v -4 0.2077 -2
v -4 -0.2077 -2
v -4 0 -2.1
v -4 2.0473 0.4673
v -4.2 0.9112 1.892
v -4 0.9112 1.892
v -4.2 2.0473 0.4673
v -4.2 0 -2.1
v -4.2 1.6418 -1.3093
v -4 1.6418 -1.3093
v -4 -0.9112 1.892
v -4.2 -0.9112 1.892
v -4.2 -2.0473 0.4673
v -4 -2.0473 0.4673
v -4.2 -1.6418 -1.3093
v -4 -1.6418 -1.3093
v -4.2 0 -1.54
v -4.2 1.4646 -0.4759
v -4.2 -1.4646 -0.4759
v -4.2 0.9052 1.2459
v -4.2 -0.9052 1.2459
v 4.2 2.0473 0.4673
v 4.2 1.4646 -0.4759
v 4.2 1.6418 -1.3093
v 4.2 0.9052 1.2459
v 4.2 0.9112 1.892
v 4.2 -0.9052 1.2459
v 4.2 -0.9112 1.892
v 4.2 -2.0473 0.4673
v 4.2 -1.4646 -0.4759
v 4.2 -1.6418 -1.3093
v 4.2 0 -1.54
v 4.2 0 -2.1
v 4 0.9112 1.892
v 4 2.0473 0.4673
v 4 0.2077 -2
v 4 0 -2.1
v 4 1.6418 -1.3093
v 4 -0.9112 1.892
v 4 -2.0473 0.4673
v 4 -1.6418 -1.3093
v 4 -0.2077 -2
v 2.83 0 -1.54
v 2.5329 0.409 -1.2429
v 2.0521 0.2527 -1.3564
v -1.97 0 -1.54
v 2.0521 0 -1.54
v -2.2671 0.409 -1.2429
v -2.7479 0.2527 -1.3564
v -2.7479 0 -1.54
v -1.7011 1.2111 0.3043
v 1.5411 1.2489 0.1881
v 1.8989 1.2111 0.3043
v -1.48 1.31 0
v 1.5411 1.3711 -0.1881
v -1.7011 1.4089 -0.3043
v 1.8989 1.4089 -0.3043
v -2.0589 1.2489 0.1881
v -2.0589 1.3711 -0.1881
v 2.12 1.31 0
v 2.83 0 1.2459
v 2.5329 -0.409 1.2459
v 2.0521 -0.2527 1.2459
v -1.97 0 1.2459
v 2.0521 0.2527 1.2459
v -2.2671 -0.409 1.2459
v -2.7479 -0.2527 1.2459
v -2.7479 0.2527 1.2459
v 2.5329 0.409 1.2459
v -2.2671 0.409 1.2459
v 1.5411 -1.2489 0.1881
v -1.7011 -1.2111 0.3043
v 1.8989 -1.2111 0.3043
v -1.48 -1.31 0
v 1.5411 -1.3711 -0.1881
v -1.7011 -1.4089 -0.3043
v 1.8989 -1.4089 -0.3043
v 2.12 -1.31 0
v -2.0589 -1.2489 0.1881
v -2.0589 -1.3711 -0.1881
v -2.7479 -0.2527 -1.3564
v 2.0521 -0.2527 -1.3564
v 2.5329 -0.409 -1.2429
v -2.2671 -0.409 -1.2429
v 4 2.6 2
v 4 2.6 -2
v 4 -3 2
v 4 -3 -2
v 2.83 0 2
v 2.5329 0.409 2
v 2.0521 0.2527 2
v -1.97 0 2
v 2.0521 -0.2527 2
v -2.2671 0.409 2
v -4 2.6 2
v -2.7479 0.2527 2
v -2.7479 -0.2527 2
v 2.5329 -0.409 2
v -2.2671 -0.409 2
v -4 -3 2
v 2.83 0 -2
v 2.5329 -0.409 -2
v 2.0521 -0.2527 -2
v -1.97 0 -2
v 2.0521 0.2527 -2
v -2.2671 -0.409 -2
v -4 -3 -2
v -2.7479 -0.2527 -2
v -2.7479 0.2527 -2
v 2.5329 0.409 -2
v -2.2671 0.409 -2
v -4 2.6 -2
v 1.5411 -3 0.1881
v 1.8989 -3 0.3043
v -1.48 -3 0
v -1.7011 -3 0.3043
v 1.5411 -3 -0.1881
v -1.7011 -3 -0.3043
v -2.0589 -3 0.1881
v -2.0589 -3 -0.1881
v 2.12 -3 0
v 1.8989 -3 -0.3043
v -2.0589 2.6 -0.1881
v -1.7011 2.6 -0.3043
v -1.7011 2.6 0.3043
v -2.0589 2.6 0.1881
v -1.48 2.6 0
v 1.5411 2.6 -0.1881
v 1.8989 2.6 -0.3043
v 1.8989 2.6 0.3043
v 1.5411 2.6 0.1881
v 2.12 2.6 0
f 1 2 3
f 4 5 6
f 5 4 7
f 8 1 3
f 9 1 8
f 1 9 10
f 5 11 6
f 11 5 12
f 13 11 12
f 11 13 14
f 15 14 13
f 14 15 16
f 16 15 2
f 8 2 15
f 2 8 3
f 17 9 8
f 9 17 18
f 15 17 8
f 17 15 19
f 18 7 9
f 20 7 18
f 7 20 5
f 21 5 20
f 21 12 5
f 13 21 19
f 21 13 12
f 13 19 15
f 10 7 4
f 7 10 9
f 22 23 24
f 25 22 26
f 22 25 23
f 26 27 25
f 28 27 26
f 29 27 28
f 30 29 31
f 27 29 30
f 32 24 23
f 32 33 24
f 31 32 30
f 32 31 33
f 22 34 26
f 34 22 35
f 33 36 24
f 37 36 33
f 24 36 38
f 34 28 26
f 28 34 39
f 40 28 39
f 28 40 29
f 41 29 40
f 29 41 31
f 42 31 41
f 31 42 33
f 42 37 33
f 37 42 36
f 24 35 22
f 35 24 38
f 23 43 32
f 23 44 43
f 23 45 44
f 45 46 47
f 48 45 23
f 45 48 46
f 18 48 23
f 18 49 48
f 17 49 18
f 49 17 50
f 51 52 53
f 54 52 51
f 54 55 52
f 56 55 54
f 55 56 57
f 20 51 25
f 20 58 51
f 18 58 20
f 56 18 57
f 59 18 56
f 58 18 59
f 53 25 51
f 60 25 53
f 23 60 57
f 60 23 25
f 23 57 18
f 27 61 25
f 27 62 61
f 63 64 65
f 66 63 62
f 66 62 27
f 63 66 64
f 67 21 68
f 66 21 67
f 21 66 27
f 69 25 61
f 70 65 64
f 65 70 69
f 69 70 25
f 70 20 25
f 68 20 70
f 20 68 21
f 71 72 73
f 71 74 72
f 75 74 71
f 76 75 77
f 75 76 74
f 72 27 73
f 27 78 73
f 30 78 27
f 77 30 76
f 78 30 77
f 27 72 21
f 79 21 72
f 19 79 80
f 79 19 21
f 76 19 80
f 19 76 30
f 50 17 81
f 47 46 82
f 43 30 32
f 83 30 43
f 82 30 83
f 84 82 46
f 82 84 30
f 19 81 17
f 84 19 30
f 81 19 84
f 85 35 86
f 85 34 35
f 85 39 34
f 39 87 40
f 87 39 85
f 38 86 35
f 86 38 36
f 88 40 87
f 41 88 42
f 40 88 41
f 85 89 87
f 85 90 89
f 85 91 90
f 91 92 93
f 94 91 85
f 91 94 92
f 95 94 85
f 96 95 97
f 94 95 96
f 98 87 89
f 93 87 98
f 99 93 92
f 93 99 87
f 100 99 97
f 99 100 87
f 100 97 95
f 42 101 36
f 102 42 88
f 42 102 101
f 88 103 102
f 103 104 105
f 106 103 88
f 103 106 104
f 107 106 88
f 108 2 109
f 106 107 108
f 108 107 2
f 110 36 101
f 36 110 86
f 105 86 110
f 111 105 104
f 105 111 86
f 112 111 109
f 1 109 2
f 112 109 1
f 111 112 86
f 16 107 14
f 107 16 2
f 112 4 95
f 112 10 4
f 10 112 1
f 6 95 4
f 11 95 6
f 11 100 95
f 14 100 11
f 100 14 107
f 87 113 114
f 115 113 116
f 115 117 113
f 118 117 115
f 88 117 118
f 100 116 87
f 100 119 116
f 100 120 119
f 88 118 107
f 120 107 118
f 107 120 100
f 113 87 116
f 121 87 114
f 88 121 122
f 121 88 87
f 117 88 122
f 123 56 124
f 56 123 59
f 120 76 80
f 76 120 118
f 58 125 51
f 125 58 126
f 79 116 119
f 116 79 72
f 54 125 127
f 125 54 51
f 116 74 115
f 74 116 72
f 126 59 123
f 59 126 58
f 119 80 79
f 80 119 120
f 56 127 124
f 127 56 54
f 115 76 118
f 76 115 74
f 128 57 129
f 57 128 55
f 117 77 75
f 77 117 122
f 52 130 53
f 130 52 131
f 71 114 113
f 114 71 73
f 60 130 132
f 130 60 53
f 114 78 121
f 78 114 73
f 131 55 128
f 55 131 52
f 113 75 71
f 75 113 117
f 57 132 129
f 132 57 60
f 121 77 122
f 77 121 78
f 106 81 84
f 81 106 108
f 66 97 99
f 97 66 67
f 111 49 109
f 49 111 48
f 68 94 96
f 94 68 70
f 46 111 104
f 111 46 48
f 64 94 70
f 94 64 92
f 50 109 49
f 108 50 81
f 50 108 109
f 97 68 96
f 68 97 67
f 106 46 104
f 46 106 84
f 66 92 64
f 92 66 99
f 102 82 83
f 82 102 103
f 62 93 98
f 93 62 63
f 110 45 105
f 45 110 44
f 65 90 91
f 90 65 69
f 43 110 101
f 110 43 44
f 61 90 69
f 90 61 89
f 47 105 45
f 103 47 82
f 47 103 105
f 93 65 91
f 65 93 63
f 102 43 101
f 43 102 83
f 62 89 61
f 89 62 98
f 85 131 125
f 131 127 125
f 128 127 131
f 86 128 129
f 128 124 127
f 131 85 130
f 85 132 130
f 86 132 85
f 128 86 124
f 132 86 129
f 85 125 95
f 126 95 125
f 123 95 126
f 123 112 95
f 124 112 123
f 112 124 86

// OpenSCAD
// Parameters
total_length = 8.0; //[4.0:16.0:0.1]
scale = 0.2; //[0.1:0.4:0.01]
bearing_od_mm = 3.0; //[1.5:6.0:0.05]
bearing_length_mm = 4.8; //[2.4:9.6:0.05]
rod_diameter_mm = 1.6; //[0.8:3.2:0.05]
print_clearance_mm = 0.04; //[0.0:0.2:0.01]
bore_diameter_mm = 3.08; //[2.8:3.4:0.01]
block_length_mm = 8.0; //[4.0:16.0:0.1]
block_width_mm = 6.0; //[3.0:12.0:0.1]
block_height_mm = 4.0; //[2.0:8.0:0.1]
wall_thickness_mm = 0.6; //[0.3:1.2:0.05]
end_stop_lip_mm = 0.2; //[0.1:0.6:0.05]
use_split_clamp = 1; //[0:1:1]
clamp_slot_width_mm = 0.4; //[0.1:1.0:0.05]
clamp_bolt_hole_diameter_mm = 0.64; //[0.4:1.2:0.02]
clamp_bolt_spacing_mm = 3.6; //[2.0:6.0:0.1]
mount_hole_diameter_mm = 0.86; //[0.5:1.6:0.02]
mount_hole_spacing_mm = 4.8; //[2.0:8.0:0.1]
mount_hole_edge_margin_mm = 1.0; //[0.5:2.0:0.05]
overlap_mm = 0.2; //[0.05:0.6:0.05]

// Base Shapes
module holder_block() {
  cube([block_length_mm, block_width_mm, block_height_mm], center=true);
}

module bearing_bore() {
  rotate([0, 90, 0])
    cylinder(r=bore_diameter_mm/2, h=block_length_mm + 2*overlap_mm, center=true);
}

module split_clamp_slot() {
  translate([0, block_width_mm/2 - clamp_slot_width_mm/2, 0])
    cube([block_length_mm + 2*overlap_mm, clamp_slot_width_mm, block_height_mm + 2*overlap_mm], center=true);
}

module clamp_bolt_hole() {
  rotate([90, 0, 0])
    cylinder(r=clamp_bolt_hole_diameter_mm/2, h=block_width_mm + 2*overlap_mm, center=true);
}

module mounting_hole() {
  cylinder(r=mount_hole_diameter_mm/2, h=block_height_mm + 2*overlap_mm, center=true);
}

module bearing_end_stop_lip() {
  rotate([0, 90, 0])
    cylinder(r=bearing_od_mm/2 + wall_thickness_mm, h=end_stop_lip_mm, center=true);
}

module bearing_end_stop_clear() {
  rotate([0, 90, 0])
    cylinder(r=bearing_od_mm/2 + print_clearance_mm, h=end_stop_lip_mm + 2*overlap_mm, center=true);
}

module linear_bearing() {
  rotate([0, 90, 0])
    cylinder(r=bearing_od_mm/2, h=bearing_length_mm, center=true);
}

// Operations
module bearing_end_stops() {
  difference() {
    union() {
      translate([-block_length_mm/2 + end_stop_lip_mm/2 - overlap_mm, 0, 0])
        bearing_end_stop_lip();
      translate([block_length_mm/2 - end_stop_lip_mm/2 + overlap_mm, 0, 0])
        bearing_end_stop_lip();
    }
    translate([-block_length_mm/2 + end_stop_lip_mm/2 - overlap_mm, 0, 0])
      bearing_end_stop_clear();
    translate([block_length_mm/2 - end_stop_lip_mm/2 + overlap_mm, 0, 0])
      bearing_end_stop_clear();
  }
}

module holder_block_with_stops() {
  union() {
    holder_block();
    bearing_end_stops();
  }
}

module clamp_bolt_holes() {
  union() {
    translate([-clamp_bolt_spacing_mm/2, 0, 0])
      clamp_bolt_hole();
    translate([clamp_bolt_spacing_mm/2, 0, 0])
      clamp_bolt_hole();
  }
}

module mounting_holes() {
  union() {
    translate([-mount_hole_spacing_mm/2, 0, 0])
      mounting_hole();
    translate([mount_hole_spacing_mm/2, 0, 0])
      mounting_hole();
  }
}

module holder_block_cutouts() {
  difference() {
    holder_block_with_stops();
    bearing_bore();
    split_clamp_slot();
    clamp_bolt_holes();
    mounting_holes();
  }
}

// Final Output
holder_block_cutouts();
